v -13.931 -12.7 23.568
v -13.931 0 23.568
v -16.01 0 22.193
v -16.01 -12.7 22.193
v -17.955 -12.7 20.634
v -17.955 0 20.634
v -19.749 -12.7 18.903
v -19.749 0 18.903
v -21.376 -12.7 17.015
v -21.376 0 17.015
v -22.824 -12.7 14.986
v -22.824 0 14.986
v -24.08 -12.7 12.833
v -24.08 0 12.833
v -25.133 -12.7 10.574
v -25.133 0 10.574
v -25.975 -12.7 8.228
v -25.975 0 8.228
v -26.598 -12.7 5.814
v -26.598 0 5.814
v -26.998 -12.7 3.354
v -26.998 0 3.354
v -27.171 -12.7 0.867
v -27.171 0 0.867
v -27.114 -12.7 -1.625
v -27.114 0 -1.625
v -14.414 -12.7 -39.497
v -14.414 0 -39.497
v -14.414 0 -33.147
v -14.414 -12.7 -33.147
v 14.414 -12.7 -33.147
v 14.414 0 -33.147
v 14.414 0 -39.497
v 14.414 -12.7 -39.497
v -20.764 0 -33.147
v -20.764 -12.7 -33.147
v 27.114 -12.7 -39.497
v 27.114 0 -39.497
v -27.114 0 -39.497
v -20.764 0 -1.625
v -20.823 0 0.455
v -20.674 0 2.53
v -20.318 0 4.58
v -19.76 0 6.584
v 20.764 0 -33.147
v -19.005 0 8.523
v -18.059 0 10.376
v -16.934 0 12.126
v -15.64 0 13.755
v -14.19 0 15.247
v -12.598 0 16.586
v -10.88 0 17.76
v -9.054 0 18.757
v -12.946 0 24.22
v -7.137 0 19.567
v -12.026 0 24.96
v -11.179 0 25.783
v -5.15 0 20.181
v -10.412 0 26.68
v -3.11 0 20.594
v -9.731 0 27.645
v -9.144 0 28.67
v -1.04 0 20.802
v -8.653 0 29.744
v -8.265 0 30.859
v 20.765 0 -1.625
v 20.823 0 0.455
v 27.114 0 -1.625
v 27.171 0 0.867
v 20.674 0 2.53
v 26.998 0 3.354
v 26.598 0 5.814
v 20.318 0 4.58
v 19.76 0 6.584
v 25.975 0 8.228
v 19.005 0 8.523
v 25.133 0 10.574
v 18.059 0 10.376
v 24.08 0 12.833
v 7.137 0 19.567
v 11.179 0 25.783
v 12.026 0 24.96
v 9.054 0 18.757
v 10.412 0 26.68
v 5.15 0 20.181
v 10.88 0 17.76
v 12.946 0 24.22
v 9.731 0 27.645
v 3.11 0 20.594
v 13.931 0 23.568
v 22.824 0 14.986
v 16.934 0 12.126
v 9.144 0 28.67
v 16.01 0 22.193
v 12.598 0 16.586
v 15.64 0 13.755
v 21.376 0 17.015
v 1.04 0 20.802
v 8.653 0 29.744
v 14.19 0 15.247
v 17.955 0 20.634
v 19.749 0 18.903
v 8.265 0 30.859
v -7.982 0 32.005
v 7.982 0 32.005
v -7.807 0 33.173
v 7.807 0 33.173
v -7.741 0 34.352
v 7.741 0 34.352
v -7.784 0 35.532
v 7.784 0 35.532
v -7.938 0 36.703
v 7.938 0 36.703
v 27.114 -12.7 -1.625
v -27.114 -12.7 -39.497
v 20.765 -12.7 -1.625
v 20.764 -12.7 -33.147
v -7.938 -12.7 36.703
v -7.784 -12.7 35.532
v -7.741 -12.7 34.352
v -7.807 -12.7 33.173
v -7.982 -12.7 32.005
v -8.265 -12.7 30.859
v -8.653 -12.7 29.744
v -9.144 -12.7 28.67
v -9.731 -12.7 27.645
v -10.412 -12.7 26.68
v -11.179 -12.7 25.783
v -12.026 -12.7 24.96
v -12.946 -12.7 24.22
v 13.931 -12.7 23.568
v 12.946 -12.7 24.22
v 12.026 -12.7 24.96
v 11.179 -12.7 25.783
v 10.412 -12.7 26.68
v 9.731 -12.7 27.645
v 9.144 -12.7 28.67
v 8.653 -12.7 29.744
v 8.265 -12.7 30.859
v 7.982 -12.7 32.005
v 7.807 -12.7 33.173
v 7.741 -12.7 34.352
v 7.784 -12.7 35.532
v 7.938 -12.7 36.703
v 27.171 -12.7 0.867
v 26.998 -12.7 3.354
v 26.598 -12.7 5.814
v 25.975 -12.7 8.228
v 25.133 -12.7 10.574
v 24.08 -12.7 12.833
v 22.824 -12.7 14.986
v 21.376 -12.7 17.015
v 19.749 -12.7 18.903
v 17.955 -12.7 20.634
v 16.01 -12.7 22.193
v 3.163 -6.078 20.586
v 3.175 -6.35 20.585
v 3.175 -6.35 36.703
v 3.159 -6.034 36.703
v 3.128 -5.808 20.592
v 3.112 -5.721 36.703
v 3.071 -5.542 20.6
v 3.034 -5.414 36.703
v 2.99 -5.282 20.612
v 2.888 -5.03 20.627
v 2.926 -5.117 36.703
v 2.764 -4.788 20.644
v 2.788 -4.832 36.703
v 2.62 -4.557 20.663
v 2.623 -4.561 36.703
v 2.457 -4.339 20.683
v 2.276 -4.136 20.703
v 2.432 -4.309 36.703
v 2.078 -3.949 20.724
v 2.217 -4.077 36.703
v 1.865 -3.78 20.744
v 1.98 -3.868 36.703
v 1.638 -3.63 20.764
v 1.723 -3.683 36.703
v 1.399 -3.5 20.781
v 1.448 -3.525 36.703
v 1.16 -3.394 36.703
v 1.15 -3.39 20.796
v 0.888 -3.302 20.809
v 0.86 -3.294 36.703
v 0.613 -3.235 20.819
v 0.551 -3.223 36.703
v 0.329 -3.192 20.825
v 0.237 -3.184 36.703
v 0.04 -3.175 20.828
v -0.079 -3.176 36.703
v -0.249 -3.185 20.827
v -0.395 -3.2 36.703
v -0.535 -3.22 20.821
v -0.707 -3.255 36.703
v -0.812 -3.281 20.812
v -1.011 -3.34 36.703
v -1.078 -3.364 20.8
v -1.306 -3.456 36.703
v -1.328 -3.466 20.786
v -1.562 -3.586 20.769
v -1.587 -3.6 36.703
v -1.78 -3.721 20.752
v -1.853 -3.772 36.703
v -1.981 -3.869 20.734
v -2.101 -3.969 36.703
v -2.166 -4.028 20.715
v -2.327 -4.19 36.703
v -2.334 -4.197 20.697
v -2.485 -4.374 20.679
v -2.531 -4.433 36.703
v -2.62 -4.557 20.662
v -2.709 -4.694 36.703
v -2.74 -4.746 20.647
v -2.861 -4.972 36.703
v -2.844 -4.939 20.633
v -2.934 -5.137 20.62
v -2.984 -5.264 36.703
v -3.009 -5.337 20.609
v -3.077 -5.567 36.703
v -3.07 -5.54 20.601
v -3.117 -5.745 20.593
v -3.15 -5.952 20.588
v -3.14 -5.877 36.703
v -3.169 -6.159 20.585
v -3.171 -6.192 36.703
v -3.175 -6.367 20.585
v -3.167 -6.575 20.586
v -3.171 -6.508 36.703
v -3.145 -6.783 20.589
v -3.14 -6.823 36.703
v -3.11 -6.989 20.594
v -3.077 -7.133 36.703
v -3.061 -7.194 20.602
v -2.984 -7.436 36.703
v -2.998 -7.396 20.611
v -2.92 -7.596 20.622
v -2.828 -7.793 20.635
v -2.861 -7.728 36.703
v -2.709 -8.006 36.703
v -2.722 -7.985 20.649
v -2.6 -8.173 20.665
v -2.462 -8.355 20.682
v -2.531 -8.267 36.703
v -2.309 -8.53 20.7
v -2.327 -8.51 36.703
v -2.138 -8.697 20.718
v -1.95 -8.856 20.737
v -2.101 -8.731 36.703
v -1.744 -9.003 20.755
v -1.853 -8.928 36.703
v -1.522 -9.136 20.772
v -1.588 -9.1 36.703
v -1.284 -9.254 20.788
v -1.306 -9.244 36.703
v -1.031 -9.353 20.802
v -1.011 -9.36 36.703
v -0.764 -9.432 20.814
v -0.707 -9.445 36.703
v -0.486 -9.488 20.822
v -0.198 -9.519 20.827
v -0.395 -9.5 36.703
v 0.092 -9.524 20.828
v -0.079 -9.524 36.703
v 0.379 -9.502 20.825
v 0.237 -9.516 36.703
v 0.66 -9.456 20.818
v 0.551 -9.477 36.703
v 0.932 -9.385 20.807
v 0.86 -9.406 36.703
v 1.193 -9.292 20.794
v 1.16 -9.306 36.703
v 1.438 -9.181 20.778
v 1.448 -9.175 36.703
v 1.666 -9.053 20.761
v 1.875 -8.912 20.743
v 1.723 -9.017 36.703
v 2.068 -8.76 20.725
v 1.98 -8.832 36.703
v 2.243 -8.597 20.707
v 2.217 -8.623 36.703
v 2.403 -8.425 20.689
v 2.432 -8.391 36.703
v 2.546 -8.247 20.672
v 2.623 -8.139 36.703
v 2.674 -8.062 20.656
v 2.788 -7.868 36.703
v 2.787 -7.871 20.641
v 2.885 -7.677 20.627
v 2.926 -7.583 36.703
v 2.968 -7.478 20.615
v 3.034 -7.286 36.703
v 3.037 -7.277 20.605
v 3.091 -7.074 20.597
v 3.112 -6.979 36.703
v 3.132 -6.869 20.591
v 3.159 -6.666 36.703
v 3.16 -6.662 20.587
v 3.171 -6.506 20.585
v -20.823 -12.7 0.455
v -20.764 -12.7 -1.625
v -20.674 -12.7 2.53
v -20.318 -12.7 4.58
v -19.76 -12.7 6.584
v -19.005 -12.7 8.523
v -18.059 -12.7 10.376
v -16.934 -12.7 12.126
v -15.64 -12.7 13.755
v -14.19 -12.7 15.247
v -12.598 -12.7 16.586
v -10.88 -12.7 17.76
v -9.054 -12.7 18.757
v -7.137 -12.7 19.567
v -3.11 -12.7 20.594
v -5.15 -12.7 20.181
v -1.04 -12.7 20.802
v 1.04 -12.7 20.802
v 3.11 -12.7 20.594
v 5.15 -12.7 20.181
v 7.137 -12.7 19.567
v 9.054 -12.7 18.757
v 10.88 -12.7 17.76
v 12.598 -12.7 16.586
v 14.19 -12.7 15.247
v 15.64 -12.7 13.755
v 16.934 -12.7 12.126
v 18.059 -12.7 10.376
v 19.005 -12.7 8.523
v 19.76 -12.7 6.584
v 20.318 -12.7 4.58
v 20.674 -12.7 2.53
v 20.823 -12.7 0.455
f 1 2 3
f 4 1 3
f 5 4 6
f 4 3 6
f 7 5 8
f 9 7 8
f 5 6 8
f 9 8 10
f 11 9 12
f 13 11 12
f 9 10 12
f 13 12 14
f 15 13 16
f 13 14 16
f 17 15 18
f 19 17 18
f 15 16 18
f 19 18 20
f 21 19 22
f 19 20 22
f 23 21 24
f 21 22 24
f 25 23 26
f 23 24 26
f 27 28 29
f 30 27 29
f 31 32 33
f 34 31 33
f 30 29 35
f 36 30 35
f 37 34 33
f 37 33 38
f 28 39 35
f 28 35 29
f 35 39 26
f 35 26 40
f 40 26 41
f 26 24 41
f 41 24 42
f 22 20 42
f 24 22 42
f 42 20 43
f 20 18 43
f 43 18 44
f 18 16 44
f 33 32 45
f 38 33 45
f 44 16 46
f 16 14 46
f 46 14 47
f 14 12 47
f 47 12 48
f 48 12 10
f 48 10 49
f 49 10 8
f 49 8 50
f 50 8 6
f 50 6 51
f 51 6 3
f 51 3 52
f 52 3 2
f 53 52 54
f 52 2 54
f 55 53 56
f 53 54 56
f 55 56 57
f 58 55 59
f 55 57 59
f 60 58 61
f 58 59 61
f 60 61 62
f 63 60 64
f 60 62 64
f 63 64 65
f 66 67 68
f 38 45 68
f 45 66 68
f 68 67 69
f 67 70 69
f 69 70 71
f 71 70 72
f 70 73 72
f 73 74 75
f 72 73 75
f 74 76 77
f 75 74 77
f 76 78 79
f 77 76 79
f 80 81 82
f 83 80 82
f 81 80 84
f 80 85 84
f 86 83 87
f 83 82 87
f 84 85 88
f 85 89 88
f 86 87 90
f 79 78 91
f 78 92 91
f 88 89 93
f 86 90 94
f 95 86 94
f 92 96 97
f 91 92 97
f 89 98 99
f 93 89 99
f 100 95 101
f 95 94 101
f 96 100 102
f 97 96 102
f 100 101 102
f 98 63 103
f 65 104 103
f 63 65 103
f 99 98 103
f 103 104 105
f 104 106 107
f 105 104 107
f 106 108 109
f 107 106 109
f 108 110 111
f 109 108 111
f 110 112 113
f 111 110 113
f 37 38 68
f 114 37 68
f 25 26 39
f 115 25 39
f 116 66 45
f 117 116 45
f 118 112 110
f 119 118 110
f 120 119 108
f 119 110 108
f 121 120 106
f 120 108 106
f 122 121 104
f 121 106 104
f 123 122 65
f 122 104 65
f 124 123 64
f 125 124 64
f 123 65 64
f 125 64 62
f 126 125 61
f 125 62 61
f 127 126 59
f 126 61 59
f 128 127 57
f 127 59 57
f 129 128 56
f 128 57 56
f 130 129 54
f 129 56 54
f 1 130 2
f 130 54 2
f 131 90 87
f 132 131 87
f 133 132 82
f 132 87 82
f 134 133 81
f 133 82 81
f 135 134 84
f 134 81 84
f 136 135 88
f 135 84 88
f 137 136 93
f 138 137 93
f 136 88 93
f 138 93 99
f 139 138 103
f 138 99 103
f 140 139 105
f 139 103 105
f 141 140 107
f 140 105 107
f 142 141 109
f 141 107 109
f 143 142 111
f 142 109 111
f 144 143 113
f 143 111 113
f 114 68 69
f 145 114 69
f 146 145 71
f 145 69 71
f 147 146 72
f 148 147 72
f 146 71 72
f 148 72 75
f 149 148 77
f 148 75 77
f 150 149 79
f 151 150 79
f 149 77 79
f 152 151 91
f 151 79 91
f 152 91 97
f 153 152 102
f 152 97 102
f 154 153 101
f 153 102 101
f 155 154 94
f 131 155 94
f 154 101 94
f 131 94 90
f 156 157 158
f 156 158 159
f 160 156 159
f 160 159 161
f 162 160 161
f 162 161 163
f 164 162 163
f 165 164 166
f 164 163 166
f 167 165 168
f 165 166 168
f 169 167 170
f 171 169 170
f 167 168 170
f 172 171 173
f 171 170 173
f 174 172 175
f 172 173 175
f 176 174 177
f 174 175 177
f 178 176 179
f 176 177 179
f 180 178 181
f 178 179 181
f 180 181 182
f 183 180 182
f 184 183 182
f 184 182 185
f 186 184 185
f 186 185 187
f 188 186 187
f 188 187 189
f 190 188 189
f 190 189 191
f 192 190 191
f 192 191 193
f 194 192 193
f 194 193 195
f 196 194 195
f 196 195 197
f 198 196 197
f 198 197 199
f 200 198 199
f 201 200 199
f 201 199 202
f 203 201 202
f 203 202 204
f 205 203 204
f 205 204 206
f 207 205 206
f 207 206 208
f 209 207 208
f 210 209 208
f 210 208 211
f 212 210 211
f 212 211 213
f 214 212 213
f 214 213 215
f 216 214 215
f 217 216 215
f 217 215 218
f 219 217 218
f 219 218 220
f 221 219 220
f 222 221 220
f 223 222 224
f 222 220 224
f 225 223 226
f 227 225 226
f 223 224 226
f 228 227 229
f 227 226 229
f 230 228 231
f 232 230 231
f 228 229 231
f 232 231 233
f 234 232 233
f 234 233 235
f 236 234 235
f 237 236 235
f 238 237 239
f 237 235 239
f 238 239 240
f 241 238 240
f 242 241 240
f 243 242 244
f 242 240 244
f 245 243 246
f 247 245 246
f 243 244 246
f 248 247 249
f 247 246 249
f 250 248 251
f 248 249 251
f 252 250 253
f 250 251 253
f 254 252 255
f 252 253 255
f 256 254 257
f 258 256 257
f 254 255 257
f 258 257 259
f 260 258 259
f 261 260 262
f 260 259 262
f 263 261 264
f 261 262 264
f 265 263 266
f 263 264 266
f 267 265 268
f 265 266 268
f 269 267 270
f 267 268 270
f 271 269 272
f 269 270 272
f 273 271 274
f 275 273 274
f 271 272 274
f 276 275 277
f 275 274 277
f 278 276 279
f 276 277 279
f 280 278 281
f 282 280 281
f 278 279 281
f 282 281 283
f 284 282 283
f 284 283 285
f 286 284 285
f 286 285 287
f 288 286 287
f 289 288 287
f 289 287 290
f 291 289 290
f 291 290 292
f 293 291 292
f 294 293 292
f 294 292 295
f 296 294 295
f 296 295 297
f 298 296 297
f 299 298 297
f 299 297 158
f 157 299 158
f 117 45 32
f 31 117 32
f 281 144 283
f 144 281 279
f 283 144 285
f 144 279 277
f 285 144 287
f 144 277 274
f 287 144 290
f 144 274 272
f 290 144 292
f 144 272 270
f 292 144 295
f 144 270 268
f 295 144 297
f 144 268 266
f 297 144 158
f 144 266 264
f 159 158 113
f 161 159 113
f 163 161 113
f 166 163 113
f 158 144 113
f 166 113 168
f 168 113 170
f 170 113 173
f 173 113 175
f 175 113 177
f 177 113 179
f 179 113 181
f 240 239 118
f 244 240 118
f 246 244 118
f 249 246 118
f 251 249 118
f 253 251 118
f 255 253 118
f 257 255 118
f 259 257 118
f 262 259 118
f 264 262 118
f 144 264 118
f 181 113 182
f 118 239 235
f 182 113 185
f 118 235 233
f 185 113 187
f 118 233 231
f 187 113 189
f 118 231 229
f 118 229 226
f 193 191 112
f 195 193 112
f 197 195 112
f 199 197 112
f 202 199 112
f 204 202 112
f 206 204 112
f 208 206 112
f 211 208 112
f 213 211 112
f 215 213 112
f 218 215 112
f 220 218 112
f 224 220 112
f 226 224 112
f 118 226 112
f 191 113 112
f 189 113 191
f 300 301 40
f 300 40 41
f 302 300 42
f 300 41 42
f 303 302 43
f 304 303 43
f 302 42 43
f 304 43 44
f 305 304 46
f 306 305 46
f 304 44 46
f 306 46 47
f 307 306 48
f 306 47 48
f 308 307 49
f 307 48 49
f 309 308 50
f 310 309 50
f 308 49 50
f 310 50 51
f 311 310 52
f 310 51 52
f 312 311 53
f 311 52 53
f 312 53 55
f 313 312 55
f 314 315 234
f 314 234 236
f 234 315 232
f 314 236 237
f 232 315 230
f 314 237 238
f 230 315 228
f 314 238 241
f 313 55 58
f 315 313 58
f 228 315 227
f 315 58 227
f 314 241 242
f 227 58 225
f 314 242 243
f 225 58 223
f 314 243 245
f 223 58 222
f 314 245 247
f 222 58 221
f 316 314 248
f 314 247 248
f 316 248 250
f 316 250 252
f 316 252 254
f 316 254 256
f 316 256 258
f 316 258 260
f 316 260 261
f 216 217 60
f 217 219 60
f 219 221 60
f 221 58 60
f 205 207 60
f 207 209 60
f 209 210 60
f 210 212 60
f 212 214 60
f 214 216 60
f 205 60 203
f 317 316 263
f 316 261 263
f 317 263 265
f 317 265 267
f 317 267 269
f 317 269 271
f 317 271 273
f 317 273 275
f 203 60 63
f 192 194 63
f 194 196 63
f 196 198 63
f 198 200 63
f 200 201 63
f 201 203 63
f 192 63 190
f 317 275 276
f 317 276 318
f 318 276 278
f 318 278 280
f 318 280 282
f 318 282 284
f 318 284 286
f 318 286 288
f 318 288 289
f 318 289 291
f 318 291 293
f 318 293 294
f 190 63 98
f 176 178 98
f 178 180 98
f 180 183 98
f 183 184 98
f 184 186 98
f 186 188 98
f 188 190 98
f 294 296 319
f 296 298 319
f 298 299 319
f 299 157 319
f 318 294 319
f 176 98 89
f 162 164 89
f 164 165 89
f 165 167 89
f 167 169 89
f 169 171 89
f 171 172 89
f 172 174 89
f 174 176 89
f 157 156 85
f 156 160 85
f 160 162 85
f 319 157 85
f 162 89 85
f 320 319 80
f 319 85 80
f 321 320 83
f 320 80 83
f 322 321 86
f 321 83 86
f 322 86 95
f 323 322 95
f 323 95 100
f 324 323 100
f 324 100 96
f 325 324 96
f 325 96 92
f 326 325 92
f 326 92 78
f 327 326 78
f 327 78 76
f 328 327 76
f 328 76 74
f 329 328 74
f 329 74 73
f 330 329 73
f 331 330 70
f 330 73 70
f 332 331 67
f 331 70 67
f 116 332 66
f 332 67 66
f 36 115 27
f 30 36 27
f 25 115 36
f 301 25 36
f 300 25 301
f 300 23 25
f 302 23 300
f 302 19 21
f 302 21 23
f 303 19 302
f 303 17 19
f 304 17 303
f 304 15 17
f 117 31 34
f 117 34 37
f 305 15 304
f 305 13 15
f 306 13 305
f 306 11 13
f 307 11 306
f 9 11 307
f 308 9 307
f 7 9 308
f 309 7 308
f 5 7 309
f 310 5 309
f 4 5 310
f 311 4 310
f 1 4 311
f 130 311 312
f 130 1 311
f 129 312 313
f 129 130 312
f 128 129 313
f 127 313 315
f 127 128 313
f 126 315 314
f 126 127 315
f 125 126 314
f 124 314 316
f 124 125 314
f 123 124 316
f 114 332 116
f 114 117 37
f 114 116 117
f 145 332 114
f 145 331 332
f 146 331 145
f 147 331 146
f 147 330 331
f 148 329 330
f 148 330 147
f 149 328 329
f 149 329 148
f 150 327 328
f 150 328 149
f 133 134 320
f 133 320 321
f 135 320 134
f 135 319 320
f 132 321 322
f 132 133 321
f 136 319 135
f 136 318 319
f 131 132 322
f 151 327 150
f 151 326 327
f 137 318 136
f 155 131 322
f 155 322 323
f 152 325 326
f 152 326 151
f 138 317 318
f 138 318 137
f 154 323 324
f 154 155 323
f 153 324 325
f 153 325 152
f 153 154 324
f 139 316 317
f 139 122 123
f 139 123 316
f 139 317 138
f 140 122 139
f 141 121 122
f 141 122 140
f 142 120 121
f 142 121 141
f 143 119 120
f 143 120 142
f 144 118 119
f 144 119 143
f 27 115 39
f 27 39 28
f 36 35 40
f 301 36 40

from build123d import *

# Parameters (mm, degrees)
F1_DEPTH = 12.7
F2_R     = 3.175
F3_DEPTH = 25.4


with BuildPart() as f1:
    # F0 (on Front) → F1 (new body)
    with BuildSketch(Plane.XZ):
        with BuildLine():
            Line((-20.7645, -33.147), (-20.7645, -1.625153))
            ThreePointArc((-20.7645, -1.625153), (0, 20.828), (20.7645, -1.625153))
            Line((20.7645, -1.625153), (20.7645, -33.147))
            Line((20.7645, -33.147), (14.4145, -33.147))
            Line((14.4145, -33.147), (14.4145, -39.497))
            Line((14.4145, -39.497), (27.1145, -39.497))
            Line((27.1145, -39.497), (27.1145, -1.625153))
            ThreePointArc((27.1145, -1.625153), (24.080006, 12.833079), (13.930541, 23.567929))
            ThreePointArc((13.930541, 23.567929), (8.88597, 29.201016), (7.9375, 36.703))
            Line((7.9375, 36.703), (0, 36.703))
            Line((0, 36.703), (-7.9375, 36.703))
            ThreePointArc((-7.9375, 36.703), (-8.88597, 29.201016), (-13.930541, 23.567929))
            ThreePointArc((-13.930541, 23.567929), (-24.080006, 12.833079), (-27.1145, -1.625153))
            Line((-27.1145, -1.625153), (-27.1145, -39.497))
            Line((-27.1145, -39.497), (-14.4145, -39.497))
            Line((-14.4145, -39.497), (-14.4145, -33.147))
            Line((-14.4145, -33.147), (-20.7645, -33.147))
        make_face()
    extrude(amount=F1_DEPTH)

    # F2 (on face) → F3 (cut)
    with BuildSketch(Plane.XY.offset(36.703)):
        with Locations((0, -6.35)):
            Circle(F2_R)
    extrude(amount=-F3_DEPTH, mode=Mode.SUBTRACT)


solid = f1.part
